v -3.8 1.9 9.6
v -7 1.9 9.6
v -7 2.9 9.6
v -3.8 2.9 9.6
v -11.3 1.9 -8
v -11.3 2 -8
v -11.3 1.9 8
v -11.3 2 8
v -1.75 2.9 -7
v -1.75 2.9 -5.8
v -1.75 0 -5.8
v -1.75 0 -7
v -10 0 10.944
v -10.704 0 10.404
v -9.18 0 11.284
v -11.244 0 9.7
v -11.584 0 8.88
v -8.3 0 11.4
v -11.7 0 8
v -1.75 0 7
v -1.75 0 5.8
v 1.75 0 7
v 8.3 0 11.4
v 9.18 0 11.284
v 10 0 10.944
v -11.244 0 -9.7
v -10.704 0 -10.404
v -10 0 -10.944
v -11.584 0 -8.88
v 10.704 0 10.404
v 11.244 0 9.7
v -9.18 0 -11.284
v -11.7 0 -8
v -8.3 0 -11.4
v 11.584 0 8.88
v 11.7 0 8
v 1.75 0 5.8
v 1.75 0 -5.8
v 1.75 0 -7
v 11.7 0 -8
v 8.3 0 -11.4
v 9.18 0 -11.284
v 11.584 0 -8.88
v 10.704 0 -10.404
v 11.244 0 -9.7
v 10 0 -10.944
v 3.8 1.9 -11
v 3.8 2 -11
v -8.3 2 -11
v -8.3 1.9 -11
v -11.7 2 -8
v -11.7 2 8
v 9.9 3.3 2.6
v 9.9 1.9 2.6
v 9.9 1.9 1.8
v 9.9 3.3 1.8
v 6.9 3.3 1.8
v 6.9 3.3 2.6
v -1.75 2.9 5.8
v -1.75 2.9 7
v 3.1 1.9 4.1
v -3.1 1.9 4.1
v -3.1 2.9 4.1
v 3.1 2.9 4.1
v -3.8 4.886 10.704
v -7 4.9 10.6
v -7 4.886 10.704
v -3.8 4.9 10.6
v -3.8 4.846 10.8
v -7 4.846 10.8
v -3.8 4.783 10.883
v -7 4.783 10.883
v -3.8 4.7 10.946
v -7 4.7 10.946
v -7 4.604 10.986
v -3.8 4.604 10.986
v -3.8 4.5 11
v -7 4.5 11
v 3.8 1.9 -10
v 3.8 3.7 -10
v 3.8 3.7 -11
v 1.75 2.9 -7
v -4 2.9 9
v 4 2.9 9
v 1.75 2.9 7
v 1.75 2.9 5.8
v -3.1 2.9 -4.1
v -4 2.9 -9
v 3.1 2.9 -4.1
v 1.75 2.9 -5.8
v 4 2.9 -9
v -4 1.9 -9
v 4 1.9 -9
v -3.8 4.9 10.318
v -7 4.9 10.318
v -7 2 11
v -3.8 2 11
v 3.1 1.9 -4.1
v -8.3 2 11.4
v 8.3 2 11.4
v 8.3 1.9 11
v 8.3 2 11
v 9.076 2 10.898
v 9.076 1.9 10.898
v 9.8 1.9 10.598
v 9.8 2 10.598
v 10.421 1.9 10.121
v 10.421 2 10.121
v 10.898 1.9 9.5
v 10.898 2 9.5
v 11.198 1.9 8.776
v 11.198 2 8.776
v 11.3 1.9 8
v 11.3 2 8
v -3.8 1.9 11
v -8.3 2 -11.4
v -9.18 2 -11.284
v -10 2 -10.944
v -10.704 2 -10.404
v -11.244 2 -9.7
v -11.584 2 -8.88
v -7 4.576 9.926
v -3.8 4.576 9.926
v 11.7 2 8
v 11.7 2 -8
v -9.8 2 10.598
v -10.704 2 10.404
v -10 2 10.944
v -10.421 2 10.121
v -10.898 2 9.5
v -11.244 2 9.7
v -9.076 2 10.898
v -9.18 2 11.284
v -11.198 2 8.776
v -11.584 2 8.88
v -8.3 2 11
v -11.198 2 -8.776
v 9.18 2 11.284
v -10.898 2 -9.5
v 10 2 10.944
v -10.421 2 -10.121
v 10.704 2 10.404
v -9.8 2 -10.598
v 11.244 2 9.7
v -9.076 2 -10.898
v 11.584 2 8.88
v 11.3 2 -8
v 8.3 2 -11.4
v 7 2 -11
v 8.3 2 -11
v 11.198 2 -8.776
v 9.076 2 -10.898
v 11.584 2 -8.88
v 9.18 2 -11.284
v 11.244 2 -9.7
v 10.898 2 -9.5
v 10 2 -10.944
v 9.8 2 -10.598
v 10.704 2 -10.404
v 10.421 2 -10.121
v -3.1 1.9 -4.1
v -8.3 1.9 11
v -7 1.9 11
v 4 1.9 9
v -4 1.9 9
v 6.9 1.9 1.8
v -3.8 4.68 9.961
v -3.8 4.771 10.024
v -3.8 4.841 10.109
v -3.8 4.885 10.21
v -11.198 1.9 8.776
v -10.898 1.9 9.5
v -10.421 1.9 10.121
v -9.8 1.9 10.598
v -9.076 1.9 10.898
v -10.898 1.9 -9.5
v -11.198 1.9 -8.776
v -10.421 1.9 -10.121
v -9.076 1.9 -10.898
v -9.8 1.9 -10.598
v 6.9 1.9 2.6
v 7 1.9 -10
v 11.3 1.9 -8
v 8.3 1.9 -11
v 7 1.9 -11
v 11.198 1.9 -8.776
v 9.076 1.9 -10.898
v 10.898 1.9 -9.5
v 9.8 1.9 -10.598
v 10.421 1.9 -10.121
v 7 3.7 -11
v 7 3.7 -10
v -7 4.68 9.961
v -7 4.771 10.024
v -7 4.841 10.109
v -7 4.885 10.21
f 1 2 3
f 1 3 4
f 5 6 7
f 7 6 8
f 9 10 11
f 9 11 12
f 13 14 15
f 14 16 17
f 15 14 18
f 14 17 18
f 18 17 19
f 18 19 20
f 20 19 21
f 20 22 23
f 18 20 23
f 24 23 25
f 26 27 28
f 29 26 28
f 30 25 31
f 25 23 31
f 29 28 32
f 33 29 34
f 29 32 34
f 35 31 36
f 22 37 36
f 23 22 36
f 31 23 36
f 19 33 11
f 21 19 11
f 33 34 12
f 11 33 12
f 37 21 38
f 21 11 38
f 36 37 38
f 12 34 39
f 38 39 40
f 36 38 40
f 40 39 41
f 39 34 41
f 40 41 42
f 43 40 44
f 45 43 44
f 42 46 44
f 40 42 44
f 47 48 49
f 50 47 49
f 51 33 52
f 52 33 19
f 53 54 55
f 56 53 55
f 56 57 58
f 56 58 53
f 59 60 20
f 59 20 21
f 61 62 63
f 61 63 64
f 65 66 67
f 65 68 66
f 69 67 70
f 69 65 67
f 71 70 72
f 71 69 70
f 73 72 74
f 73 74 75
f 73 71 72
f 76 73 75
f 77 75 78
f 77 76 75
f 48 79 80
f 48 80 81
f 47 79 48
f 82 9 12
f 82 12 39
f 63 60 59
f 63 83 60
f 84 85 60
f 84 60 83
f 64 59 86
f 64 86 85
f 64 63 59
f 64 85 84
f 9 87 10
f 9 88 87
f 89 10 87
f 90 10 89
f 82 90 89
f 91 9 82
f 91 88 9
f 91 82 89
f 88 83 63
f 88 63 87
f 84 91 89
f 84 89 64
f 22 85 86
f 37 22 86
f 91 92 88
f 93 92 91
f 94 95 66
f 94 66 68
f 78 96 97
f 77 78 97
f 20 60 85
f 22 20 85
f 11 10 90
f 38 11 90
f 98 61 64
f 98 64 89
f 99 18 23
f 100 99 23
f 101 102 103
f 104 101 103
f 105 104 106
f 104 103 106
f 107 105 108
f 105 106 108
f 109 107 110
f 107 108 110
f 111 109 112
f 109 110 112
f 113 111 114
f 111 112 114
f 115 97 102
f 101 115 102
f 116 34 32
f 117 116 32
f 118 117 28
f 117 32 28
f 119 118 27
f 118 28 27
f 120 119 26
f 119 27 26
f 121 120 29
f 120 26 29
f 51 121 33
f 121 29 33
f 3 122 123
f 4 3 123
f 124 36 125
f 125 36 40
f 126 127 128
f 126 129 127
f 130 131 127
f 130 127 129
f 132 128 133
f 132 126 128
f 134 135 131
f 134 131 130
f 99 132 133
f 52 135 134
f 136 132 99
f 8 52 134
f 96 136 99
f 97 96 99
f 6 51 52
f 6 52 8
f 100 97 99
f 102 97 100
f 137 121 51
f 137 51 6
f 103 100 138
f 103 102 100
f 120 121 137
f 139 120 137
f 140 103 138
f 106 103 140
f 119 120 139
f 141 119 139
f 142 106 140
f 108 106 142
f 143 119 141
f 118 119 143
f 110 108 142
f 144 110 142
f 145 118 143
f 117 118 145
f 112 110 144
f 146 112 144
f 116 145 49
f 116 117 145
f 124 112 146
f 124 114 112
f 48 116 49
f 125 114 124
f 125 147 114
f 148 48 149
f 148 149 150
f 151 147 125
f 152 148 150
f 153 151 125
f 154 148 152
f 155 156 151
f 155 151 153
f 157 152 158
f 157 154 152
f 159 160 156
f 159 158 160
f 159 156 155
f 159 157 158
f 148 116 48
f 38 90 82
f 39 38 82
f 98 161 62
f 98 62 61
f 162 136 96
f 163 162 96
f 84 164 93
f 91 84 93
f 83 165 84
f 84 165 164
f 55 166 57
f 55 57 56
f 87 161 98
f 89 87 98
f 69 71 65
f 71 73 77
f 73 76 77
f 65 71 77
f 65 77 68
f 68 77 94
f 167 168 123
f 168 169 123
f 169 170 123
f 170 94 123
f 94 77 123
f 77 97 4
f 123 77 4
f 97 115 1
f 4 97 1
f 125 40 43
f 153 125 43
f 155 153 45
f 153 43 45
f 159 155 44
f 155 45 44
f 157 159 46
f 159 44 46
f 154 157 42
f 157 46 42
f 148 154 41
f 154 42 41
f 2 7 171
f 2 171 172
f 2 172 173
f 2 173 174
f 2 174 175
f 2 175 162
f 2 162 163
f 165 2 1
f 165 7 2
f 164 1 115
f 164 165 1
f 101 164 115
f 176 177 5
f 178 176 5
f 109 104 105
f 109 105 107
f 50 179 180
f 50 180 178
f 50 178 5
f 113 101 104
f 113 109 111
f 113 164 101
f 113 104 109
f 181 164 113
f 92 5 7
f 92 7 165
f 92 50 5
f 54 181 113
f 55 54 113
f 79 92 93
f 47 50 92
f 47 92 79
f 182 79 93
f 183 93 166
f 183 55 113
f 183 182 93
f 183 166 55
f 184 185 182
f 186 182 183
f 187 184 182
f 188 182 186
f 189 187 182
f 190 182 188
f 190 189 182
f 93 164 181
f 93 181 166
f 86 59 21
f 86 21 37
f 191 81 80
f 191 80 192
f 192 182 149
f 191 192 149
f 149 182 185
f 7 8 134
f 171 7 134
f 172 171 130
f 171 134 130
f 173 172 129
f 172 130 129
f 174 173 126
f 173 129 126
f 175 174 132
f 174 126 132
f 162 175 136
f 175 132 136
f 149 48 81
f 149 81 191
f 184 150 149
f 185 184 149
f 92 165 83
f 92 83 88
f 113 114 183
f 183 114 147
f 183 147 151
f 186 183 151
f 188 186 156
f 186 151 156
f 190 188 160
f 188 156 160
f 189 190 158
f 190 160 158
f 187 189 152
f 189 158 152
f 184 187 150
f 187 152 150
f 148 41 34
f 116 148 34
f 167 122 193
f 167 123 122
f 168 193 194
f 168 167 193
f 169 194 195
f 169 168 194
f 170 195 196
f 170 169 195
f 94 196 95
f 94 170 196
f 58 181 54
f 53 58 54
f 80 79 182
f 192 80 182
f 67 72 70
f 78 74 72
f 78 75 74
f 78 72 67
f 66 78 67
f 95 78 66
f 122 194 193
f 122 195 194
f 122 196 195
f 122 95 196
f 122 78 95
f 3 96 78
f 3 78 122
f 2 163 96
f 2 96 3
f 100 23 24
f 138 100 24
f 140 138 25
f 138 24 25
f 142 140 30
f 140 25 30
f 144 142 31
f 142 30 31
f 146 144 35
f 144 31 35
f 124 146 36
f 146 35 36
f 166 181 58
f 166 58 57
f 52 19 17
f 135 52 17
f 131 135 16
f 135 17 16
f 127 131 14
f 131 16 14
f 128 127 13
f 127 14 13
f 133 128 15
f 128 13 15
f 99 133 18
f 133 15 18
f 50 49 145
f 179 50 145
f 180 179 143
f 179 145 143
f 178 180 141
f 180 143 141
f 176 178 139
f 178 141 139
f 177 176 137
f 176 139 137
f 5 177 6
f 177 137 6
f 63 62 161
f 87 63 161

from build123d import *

# Parameters (mm, degrees)
RESSALTO_EXTRUS_O1_DEPTH = 2
CORTE_EXTRUS_O1_DEPTH    = 0.1
ESBO_O3_W                = 8
ESBO_O3_H                = 18
ESBO_O3_W_2              = 6.2
ESBO_O3_H_2              = 8.2
RESSALTO_EXTRUS_O2_DEPTH = 1
ESBO_O4_W                = 3.2
ESBO_O4_H                = 1
RESSALTO_EXTRUS_O3_DEPTH = 1.8
ESBO_O5_W                = 3.2
ESBO_O5_H                = 1.4
RESSALTO_EXTRUS_O4_DEPTH = 3
CHANFRO1_SIZE            = 2
CHANFRO1_SIZE2           = 0.388760618
FILETE1_R                = 0.4
ESBO_O6_W                = 3
ESBO_O6_H                = 0.8
RESSALTO_EXTRUS_O5_DEPTH = 1.4
ESBO_O7_W                = 3.5
ESBO_O7_H                = 1.2
CORTE_EXTRUS_O2_DEPTH    = 5


with BuildPart() as part:
    # Esboço1 → Ressalto-extrusão1 (new body)
    with BuildSketch(Plane(origin=(0, 0, 0), x_dir=(1, 0, 0), z_dir=(0, 1, 0))):
        with BuildLine():
            Line((-8.3, -11.4), (8.3, -11.4))
            ThreePointArc((8.3, -11.4), (10.704163056, -10.404163056), (11.7, -8))
            Line((11.7, -8), (11.7, 8))
            ThreePointArc((11.7, 8), (10.704163056, 10.404163056), (8.3, 11.4))
            Line((8.3, 11.4), (-8.3, 11.4))
            ThreePointArc((-8.3, 11.4), (-10.704163056, 10.404163056), (-11.7, 8))
            Line((-11.7, 8), (-11.7, -8))
            ThreePointArc((-11.7, -8), (-10.704163056, -10.404163056), (-8.3, -11.4))
        make_face()
    extrude(amount=RESSALTO_EXTRUS_O1_DEPTH)

    # Esboço2 → Corte-extrusão1 (cut)
    with BuildSketch(Plane(origin=(0, 2, 0), x_dir=(1, 0, 0), z_dir=(0, 1, 0))):
        with BuildLine():
            Line((-8.3, -11), (8.3, -11))
            ThreePointArc((8.3, -11), (10.421320344, -10.121320344), (11.3, -8))
            Line((11.3, -8), (11.3, 8))
            ThreePointArc((11.3, 8), (10.421320344, 10.121320344), (8.3, 11))
            Line((8.3, 11), (-8.3, 11))
            ThreePointArc((-8.3, 11), (-10.421320344, 10.121320344), (-11.3, 8))
            Line((-11.3, 8), (-11.3, -8))
            ThreePointArc((-11.3, -8), (-10.421320344, -10.121320344), (-8.3, -11))
        make_face()
    extrude(amount=-CORTE_EXTRUS_O1_DEPTH, mode=Mode.SUBTRACT)

    # Esboço3 → Ressalto-extrusão2 (add)
    with BuildSketch(Plane(origin=(0, 1.9, 0), x_dir=(1, 0, 0), z_dir=(0, 1, 0))):
        Rectangle(ESBO_O3_W, ESBO_O3_H)
        Rectangle(ESBO_O3_W_2, ESBO_O3_H_2, mode=Mode.SUBTRACT)
    extrude(amount=RESSALTO_EXTRUS_O2_DEPTH)

    # Esboço4 → Ressalto-extrusão3 (add)
    with BuildSketch(Plane(origin=(0, 1.9, 0), x_dir=(1, 0, 0), z_dir=(0, 1, 0))):
        with Locations((5.4, 10.5)):
            Rectangle(ESBO_O4_W, ESBO_O4_H)
    extrude(amount=RESSALTO_EXTRUS_O3_DEPTH)

    # Esboço5 → Ressalto-extrusão4 (add)
    with BuildSketch(Plane(origin=(0, 1.9, 0), x_dir=(1, 0, 0), z_dir=(0, 1, 0))):
        with Locations((-5.4, -10.3)):
            Rectangle(ESBO_O5_W, ESBO_O5_H)
    extrude(amount=RESSALTO_EXTRUS_O4_DEPTH)

    # Chanfro1
    chanfro1_edges = [part.edges().sort_by_distance(p)[0] for p in [
        (-5.4, 4.9, 9.6),
    ]]
    chanfro1_side = [part.faces().sort_by_distance(p)[0] for p in [
        (-5.4, 3.4, 9.6),
    ]]
    chamfer(chanfro1_edges, length=CHANFRO1_SIZE, length2=CHANFRO1_SIZE2, reference=chanfro1_side[0])

    # Filete1
    filete1_edges = [part.edges().sort_by_distance(p)[0] for p in [
        (-5.4, 4.9, 9.988760618),
        (-5.4, 4.9, 11),
    ]]
    fillet(filete1_edges, radius=FILETE1_R)

    # Esboço6 → Ressalto-extrusão5 (add)
    with BuildSketch(Plane(origin=(0, 1.9, 0), x_dir=(1, 0, 0), z_dir=(0, 1, 0))):
        with Locations((8.4, -2.2)):
            Rectangle(ESBO_O6_W, ESBO_O6_H)
    extrude(amount=RESSALTO_EXTRUS_O5_DEPTH)

    # Esboço7 → Corte-extrusão2 (cut)
    with BuildSketch(Plane(origin=(0, 2.9, 0), x_dir=(1, 0, 0), z_dir=(0, 1, 0))):
        with Locations((0, 6.4)):
            Rectangle(ESBO_O7_W, ESBO_O7_H)
        with Locations((0, -6.4)):
            Rectangle(ESBO_O7_W, ESBO_O7_H)
    extrude(amount=-CORTE_EXTRUS_O2_DEPTH, mode=Mode.SUBTRACT)


solid = part.part
